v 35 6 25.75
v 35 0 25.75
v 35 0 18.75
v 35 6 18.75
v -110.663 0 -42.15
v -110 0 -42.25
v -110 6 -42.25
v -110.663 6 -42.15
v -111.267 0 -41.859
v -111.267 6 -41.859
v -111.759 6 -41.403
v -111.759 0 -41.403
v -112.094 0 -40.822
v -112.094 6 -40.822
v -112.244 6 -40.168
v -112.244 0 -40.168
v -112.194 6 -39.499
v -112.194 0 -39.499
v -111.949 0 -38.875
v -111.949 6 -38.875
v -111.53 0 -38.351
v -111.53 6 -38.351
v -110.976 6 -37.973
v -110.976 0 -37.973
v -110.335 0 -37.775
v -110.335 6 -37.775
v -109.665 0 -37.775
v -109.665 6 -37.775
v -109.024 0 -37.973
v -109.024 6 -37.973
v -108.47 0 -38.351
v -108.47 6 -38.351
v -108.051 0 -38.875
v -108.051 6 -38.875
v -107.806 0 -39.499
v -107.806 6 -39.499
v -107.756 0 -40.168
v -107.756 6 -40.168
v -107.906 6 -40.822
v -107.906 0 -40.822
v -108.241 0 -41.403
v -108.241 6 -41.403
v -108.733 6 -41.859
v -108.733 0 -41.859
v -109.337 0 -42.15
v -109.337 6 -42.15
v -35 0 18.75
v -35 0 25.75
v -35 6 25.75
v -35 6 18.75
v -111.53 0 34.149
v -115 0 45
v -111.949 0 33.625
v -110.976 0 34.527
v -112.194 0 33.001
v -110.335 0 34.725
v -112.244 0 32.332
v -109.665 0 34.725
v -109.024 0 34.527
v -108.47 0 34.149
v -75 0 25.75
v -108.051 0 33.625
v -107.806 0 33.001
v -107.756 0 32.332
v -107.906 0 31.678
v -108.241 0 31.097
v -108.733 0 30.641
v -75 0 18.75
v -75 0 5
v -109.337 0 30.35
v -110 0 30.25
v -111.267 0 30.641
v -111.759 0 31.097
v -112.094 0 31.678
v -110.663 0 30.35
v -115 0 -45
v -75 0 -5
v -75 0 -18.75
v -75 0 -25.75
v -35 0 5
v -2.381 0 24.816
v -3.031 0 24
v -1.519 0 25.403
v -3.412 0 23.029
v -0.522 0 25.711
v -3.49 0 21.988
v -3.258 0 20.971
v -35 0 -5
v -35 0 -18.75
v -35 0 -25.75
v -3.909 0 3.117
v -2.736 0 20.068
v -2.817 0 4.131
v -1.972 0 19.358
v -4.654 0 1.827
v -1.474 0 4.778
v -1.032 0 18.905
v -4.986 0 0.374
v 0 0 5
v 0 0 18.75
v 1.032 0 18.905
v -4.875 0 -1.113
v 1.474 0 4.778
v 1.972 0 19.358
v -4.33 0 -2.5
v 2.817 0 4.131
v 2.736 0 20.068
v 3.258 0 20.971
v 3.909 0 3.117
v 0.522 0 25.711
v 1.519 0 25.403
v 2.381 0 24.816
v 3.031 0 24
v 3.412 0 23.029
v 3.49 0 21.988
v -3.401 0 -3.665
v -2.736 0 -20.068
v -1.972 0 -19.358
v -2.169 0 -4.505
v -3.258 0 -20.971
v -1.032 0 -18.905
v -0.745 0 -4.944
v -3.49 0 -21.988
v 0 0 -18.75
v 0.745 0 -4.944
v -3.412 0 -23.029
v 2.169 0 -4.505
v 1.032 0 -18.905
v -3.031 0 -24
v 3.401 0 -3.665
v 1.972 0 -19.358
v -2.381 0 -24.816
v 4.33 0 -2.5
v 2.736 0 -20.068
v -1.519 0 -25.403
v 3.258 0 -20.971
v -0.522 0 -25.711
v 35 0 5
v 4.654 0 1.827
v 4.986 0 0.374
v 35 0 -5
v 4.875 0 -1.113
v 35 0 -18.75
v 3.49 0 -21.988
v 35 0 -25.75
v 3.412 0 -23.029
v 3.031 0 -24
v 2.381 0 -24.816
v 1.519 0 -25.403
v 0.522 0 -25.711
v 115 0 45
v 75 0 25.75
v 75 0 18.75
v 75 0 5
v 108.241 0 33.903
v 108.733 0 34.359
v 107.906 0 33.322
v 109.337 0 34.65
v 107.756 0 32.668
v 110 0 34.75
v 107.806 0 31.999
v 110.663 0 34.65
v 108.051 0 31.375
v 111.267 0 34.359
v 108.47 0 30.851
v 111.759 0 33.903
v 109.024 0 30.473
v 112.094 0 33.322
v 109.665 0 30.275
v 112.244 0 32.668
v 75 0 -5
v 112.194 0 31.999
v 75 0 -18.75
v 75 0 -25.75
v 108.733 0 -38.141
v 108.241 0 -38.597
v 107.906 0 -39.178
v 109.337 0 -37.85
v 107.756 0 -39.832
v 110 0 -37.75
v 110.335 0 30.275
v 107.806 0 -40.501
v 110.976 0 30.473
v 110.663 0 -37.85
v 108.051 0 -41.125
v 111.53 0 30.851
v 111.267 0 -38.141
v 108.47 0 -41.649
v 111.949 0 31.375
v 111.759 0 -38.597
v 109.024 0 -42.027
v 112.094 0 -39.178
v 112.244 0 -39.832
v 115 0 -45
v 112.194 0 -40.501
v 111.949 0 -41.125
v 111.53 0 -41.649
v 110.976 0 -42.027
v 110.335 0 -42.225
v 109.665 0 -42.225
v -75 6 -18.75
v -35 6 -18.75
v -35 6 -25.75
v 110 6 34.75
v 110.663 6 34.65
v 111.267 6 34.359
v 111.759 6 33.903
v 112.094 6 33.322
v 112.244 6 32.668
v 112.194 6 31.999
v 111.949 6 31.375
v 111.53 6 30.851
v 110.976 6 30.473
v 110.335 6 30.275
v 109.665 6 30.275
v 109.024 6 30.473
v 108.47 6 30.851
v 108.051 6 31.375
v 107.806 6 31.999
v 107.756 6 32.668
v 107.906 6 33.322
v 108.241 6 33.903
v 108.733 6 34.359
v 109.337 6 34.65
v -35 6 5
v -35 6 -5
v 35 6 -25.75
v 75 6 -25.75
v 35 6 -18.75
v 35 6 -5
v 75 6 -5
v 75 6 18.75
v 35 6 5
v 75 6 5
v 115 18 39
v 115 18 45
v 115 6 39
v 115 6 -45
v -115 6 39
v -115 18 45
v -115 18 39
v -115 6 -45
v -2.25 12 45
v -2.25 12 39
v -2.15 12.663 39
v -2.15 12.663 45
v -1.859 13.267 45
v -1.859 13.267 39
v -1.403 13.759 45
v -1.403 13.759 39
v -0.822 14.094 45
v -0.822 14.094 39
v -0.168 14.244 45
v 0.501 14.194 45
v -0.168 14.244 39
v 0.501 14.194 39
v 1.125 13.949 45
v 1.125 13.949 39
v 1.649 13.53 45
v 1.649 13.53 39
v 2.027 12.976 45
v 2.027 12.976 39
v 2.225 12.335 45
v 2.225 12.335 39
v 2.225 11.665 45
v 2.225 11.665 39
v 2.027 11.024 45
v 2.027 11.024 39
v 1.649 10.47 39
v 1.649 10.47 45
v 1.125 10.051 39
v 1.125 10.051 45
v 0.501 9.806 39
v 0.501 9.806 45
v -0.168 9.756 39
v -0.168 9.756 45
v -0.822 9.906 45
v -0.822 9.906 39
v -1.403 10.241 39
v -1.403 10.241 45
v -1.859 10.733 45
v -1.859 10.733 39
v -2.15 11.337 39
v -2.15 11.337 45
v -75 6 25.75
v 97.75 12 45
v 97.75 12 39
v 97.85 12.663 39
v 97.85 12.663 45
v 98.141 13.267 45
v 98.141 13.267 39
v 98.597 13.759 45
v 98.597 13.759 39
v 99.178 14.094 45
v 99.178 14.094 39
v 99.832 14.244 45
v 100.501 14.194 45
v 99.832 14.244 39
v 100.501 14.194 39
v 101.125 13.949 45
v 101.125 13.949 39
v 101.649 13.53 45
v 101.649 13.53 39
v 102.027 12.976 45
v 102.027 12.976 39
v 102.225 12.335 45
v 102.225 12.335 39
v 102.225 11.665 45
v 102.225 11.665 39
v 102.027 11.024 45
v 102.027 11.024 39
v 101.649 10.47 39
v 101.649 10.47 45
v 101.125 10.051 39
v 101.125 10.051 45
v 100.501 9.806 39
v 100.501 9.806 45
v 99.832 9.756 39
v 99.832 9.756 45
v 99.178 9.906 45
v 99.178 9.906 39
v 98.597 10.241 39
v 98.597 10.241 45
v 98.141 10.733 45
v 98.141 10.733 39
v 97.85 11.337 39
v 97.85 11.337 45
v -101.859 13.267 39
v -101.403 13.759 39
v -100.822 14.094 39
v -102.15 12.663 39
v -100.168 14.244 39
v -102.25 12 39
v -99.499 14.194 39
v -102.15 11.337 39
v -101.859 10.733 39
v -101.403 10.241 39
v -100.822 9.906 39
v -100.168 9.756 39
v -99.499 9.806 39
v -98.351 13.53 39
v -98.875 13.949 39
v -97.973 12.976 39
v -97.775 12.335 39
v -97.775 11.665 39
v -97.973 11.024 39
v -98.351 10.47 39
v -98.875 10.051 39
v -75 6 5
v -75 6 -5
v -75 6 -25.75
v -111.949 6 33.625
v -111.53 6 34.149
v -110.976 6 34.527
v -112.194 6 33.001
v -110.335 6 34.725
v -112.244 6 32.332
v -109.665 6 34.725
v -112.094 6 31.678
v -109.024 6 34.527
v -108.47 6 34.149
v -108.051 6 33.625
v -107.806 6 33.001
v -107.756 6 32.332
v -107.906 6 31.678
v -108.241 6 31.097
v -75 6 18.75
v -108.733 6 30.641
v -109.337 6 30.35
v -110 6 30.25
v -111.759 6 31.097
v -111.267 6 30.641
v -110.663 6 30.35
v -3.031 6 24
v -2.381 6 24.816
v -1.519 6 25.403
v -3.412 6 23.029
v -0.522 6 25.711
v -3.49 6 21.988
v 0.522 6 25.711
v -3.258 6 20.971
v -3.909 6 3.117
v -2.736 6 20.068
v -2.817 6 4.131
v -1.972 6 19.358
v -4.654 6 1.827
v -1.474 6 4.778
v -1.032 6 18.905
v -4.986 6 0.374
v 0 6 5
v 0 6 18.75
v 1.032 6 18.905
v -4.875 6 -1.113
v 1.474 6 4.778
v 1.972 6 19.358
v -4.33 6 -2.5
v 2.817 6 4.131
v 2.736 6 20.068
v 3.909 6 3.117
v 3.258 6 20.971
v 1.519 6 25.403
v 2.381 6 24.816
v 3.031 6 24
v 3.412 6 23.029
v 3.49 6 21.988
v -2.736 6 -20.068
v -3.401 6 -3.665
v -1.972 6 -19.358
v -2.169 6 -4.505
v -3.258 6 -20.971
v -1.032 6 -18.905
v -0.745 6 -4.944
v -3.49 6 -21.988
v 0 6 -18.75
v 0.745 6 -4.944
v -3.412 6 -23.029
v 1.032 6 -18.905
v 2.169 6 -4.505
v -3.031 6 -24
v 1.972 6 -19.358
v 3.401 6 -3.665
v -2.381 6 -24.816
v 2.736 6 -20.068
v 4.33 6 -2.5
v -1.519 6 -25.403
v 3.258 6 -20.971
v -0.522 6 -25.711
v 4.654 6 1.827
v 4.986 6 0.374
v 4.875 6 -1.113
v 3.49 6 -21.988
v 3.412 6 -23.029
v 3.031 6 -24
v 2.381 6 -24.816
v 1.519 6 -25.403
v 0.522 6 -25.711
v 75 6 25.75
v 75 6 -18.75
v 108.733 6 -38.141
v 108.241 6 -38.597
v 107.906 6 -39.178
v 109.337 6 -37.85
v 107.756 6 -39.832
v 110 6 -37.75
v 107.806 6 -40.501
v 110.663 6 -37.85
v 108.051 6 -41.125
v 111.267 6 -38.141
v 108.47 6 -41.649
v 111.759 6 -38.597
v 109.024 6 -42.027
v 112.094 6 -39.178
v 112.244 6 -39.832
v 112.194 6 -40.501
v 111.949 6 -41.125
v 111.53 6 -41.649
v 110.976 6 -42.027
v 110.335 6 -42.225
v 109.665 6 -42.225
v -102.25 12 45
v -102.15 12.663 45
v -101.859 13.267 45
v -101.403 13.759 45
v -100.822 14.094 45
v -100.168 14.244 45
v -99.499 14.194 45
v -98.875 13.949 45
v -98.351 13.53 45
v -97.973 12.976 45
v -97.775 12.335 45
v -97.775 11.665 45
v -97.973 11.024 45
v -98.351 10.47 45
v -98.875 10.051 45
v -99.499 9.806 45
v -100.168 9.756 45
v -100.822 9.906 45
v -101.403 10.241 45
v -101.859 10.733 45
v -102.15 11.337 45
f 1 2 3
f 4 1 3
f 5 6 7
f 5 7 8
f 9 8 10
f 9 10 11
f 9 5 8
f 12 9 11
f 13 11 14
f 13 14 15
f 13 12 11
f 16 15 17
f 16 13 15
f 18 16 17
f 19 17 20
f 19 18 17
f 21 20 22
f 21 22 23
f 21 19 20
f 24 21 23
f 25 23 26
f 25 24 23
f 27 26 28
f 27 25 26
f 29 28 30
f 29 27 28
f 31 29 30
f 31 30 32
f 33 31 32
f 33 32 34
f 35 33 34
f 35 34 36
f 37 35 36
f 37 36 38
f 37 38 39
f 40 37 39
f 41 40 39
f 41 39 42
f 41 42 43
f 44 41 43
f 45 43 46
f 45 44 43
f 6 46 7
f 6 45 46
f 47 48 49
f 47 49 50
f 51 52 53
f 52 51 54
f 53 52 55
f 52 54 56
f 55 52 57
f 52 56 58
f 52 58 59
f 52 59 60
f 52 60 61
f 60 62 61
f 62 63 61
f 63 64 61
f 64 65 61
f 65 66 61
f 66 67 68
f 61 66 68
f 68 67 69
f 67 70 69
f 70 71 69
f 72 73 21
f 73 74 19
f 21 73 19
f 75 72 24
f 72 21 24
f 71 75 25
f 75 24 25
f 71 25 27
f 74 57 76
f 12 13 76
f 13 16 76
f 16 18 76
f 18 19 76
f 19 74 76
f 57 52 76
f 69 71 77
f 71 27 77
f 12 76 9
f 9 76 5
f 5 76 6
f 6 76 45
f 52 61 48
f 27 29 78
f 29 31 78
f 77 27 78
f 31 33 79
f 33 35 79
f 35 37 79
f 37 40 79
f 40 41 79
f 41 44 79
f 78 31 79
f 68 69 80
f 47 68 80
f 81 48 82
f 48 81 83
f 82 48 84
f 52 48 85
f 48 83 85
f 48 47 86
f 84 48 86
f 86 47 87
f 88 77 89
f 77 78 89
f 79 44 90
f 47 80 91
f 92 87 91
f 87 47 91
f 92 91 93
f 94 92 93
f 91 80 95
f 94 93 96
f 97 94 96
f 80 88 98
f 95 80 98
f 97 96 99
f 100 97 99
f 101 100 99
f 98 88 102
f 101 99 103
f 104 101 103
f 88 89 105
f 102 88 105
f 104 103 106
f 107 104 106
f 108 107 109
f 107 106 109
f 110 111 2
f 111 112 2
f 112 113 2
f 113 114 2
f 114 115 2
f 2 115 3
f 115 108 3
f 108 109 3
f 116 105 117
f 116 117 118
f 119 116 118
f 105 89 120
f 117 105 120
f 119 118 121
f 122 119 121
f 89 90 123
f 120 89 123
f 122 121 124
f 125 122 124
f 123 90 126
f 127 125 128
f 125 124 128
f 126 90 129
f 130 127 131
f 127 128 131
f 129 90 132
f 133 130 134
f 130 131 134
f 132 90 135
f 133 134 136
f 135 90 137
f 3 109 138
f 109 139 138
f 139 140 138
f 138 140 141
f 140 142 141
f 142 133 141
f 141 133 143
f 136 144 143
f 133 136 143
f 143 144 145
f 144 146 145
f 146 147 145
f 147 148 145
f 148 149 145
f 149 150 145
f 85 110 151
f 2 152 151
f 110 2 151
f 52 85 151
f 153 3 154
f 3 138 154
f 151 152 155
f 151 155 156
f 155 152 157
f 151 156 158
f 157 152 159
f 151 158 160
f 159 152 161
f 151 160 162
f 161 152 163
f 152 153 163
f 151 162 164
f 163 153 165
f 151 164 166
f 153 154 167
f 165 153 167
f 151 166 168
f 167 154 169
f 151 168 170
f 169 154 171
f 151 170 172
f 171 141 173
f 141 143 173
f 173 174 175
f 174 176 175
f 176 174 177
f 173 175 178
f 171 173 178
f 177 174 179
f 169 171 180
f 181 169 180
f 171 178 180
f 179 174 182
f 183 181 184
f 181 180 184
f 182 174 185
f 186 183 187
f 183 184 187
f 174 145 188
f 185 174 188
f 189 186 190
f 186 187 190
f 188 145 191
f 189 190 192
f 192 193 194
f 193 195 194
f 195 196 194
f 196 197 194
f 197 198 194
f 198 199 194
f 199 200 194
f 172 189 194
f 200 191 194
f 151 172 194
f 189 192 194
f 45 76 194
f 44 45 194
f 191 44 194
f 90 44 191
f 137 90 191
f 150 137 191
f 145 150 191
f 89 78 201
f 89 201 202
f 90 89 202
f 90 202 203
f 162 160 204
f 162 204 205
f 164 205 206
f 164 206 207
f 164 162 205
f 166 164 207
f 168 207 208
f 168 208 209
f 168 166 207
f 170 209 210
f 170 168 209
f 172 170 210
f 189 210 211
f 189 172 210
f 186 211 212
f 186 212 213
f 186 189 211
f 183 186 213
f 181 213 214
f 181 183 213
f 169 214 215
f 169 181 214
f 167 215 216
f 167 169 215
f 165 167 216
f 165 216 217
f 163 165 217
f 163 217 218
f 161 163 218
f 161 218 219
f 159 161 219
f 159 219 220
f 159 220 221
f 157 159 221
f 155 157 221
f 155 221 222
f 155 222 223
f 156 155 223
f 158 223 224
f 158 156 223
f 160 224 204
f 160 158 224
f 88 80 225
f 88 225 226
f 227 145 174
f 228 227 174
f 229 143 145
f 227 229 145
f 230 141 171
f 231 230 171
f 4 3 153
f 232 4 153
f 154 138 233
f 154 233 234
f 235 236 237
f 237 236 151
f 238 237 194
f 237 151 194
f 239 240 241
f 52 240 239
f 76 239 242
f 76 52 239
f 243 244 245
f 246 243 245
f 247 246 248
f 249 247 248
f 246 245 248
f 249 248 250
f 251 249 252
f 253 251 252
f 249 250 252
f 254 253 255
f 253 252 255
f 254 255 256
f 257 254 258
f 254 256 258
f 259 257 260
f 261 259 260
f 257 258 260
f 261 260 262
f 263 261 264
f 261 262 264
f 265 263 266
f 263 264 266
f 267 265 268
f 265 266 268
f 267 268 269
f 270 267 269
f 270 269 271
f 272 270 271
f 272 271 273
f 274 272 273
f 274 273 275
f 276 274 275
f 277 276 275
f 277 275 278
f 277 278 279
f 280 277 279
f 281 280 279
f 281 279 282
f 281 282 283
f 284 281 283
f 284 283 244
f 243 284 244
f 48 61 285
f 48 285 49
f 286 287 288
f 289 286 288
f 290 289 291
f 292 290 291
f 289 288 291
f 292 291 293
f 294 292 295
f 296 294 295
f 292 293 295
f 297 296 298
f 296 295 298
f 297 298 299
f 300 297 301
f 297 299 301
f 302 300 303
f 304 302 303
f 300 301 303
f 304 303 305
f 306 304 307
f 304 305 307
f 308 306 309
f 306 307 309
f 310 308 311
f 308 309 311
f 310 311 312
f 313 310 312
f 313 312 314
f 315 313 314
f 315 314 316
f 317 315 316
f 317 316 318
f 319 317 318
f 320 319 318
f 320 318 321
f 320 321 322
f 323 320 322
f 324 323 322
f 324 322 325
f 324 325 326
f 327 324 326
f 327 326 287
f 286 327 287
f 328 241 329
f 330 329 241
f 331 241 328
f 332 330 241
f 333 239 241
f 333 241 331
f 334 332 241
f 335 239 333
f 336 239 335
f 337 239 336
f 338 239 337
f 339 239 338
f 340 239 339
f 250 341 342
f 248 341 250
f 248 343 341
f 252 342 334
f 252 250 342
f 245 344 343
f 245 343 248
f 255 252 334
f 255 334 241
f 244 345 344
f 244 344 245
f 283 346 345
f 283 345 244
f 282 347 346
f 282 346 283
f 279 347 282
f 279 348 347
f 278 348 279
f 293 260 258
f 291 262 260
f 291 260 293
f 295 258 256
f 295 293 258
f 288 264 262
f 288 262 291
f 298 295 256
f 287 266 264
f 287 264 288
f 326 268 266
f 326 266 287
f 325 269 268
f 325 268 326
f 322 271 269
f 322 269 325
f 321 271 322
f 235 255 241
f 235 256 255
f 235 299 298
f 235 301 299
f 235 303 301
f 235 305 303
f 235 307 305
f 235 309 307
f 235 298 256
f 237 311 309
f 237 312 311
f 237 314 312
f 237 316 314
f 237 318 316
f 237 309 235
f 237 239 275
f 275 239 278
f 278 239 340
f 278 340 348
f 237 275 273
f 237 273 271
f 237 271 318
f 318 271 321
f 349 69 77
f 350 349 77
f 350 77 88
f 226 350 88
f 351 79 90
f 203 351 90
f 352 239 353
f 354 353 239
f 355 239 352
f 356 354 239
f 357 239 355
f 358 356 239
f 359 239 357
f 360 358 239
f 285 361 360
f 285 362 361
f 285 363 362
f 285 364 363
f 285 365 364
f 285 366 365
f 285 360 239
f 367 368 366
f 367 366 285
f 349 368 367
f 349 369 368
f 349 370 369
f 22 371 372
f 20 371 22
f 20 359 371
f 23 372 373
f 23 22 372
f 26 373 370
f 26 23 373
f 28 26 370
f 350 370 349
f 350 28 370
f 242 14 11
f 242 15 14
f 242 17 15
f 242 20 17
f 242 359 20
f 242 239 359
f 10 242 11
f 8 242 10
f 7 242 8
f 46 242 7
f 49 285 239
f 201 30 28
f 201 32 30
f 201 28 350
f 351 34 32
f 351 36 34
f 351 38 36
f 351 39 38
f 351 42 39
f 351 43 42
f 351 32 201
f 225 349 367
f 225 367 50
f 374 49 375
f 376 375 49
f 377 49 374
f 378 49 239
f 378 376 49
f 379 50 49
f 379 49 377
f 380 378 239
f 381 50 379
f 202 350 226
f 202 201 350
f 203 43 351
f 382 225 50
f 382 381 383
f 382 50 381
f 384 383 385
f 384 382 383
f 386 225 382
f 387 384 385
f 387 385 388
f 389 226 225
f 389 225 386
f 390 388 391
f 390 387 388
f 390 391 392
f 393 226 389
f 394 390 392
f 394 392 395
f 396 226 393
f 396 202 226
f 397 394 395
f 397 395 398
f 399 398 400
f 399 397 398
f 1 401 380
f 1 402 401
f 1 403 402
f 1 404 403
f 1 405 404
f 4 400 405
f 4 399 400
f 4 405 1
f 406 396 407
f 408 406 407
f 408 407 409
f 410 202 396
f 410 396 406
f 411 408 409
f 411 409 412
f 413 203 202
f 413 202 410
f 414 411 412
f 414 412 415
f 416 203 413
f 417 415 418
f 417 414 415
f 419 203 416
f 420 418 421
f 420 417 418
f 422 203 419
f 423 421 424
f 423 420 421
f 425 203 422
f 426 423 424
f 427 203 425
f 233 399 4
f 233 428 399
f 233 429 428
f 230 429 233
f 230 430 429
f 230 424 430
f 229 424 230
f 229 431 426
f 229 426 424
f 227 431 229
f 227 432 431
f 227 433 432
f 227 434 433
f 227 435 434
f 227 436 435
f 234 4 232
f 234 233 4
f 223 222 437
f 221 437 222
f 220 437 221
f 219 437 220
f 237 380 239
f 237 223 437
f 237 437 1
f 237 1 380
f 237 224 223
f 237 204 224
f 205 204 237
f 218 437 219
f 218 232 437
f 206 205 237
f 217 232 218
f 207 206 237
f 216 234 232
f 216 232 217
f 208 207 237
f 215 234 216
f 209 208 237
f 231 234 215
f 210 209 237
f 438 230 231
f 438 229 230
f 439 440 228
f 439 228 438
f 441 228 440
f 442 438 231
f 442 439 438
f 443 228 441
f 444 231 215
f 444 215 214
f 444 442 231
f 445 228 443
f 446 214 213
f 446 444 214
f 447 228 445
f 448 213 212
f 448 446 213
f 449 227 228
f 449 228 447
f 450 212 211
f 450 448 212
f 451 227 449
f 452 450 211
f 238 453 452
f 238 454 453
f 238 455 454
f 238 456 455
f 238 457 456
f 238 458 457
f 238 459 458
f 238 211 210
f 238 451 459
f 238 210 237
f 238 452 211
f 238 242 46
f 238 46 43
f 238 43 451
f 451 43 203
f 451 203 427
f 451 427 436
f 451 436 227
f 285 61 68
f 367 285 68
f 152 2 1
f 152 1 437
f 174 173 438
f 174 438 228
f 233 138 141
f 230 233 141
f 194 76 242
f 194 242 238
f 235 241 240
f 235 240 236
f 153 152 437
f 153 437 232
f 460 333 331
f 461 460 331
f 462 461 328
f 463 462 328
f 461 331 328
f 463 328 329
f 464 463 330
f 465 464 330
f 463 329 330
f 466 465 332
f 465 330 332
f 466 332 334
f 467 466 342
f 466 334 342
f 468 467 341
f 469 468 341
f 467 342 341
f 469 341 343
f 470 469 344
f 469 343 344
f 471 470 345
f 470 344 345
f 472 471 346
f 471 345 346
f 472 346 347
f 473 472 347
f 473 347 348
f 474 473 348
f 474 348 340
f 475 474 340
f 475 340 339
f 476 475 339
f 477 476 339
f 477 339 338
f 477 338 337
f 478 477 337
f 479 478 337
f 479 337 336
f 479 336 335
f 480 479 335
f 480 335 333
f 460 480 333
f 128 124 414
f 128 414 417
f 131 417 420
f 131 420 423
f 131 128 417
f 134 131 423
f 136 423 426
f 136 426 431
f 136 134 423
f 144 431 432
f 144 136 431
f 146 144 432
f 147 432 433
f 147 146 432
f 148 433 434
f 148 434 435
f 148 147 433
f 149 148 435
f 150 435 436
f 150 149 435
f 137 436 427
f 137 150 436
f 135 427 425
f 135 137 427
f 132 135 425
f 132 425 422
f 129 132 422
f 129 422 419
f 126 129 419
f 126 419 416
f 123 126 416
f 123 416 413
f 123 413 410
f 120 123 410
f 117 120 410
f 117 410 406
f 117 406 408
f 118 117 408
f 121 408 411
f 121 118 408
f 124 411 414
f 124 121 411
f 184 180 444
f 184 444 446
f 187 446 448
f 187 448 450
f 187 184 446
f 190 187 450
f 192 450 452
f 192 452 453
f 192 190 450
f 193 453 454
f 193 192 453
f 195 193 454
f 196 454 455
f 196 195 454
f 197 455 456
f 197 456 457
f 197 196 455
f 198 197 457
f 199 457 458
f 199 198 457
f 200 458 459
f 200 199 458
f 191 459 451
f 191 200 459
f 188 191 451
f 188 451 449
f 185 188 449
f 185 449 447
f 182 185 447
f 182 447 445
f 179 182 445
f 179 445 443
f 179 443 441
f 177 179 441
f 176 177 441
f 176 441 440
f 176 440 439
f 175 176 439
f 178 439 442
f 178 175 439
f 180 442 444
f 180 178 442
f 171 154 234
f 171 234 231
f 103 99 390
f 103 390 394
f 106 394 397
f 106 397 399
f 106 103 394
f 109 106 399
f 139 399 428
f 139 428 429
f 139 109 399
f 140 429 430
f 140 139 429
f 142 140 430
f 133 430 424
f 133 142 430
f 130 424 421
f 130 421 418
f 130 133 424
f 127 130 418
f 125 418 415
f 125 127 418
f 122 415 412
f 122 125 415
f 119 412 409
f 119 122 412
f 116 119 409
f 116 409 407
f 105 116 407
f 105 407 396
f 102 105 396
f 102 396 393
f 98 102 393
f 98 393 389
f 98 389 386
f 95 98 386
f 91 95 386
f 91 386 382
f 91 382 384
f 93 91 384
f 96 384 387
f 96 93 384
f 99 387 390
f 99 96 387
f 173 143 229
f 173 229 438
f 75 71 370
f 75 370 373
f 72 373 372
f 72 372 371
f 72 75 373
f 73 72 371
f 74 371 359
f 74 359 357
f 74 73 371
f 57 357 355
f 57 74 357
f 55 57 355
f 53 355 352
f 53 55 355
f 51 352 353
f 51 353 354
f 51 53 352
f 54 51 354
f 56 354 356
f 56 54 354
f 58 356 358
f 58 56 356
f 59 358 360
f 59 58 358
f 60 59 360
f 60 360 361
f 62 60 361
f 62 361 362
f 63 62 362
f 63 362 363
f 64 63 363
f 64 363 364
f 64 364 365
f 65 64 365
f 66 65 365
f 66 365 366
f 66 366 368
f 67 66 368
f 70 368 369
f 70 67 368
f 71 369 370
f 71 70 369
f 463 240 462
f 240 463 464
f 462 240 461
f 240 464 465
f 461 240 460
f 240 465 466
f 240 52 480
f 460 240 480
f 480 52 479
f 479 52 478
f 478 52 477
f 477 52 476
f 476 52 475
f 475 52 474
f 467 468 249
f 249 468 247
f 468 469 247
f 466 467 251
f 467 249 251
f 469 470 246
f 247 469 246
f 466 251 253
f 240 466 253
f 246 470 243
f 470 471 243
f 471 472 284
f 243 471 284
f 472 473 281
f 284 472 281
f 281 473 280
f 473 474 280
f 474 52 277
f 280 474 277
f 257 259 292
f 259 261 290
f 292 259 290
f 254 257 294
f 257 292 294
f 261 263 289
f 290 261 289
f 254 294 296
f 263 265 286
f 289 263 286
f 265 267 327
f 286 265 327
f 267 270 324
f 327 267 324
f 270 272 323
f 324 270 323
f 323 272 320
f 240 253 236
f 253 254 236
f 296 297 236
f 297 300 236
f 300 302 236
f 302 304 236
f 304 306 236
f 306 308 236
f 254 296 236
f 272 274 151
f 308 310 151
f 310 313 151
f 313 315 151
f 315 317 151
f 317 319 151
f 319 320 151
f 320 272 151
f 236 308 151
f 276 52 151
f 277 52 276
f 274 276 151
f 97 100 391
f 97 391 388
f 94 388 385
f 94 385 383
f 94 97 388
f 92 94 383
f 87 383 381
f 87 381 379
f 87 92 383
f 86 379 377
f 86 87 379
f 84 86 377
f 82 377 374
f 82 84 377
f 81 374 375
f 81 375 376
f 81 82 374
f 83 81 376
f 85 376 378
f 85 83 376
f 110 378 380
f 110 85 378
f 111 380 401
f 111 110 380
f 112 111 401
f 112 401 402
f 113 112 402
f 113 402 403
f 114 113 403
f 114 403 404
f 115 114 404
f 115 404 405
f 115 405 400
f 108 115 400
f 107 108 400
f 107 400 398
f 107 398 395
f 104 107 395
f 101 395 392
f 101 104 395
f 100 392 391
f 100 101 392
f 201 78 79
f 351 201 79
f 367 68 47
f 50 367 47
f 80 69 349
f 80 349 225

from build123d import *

# Parameters (mm, degrees)
SKETCH1_W           = 230
SKETCH1_H           = 90
SKETCH1_R           = 5
SKETCH1_R_2         = 3.5
SKETCH1_R_3         = 2.25
SKETCH1_W_2         = 40
SKETCH1_H_2         = 10
SKETCH1_H_3         = 7
BOSS_EXTRUDE1_DEPTH = 6
SKETCH2_W           = 230
SKETCH2_H           = 6
BOSS_EXTRUDE2_DEPTH = 12
CUT_EXTRUDE1_REACH  = 145.544
SKETCH3_R           = 2.25


with BuildPart() as part:
    # Sketch1 → Boss-Extrude1 (new body)
    with BuildSketch(Plane(origin=(0, 0, 0), x_dir=(1, 0, 0), z_dir=(0, 1, 0))):
        Rectangle(SKETCH1_W, SKETCH1_H)
        with Locations(Location((0, 0, 0), (0, 0, 270))):
            Circle(SKETCH1_R, mode=Mode.SUBTRACT)
        with Locations(Location((0, 22.25, 0), (0, 0, 270))):
            Circle(SKETCH1_R_2, mode=Mode.SUBTRACT)
        with Locations(Location((0, -22.25, 0), (0, 0, 90))):
            Circle(SKETCH1_R_2, mode=Mode.SUBTRACT)
        with Locations(Location((110, 40, 0), (0, 0, 270))):
            Circle(SKETCH1_R_3, mode=Mode.SUBTRACT)
        with Locations(Location((110, -32.5, 0), (0, 0, 270))):
            Circle(SKETCH1_R_3, mode=Mode.SUBTRACT)
        with Locations(Location((-110, 40, 0), (0, 0, 90))):
            Circle(SKETCH1_R_3, mode=Mode.SUBTRACT)
        with Locations(Location((-110, -32.5, 0), (0, 0, 90))):
            Circle(SKETCH1_R_3, mode=Mode.SUBTRACT)
        with Locations((55, 0)):
            Rectangle(SKETCH1_W_2, SKETCH1_H_2, mode=Mode.SUBTRACT)
        with Locations((55, 22.25)):
            Rectangle(SKETCH1_W_2, SKETCH1_H_3, mode=Mode.SUBTRACT)
        with Locations((55, -22.25)):
            Rectangle(SKETCH1_W_2, SKETCH1_H_3, mode=Mode.SUBTRACT)
        with Locations((-55, -22.25)):
            Rectangle(SKETCH1_W_2, SKETCH1_H_3, mode=Mode.SUBTRACT)
        with Locations((-55, 0)):
            Rectangle(SKETCH1_W_2, SKETCH1_H_2, mode=Mode.SUBTRACT)
        with Locations((-55, 22.25)):
            Rectangle(SKETCH1_W_2, SKETCH1_H_3, mode=Mode.SUBTRACT)
    extrude(amount=BOSS_EXTRUDE1_DEPTH)

    # Sketch2 → Boss-Extrude2 (add)
    with BuildSketch(Plane(origin=(0, 6, 0), x_dir=(1, 0, 0), z_dir=(0, 1, 0))):
        with Locations((0, -42)):
            Rectangle(SKETCH2_W, SKETCH2_H)
    extrude(amount=BOSS_EXTRUDE2_DEPTH)

    # Sketch3 → Cut-Extrude1 (cut, up to next)
    with BuildSketch(Plane(origin=(0, 0, 39), x_dir=(-1, 0, 0), z_dir=(0, 0, -1)), mode=Mode.PRIVATE) as cut_extrude1_sk1:
        with Locations((0, 12)):
            Circle(SKETCH3_R)
    cut_extrude1_tool1 = extrude(cut_extrude1_sk1.sketch, amount=-CUT_EXTRUDE1_REACH, mode=Mode.PRIVATE) & part.part
    # Sketch3 → Cut-Extrude1 (cut, up to next)
    with BuildSketch(Plane(origin=(0, 0, 39), x_dir=(-1, 0, 0), z_dir=(0, 0, -1)), mode=Mode.PRIVATE) as cut_extrude1_sk2:
        with Locations((100, 12)):
            Circle(SKETCH3_R)
    cut_extrude1_tool2 = extrude(cut_extrude1_sk2.sketch, amount=-CUT_EXTRUDE1_REACH, mode=Mode.PRIVATE) & part.part
    # Sketch3 → Cut-Extrude1 (cut, up to next)
    with BuildSketch(Plane(origin=(0, 0, 39), x_dir=(-1, 0, 0), z_dir=(0, 0, -1)), mode=Mode.PRIVATE) as cut_extrude1_sk3:
        with Locations((-100, 12)):
            Circle(SKETCH3_R)
    cut_extrude1_tool3 = extrude(cut_extrude1_sk3.sketch, amount=-CUT_EXTRUDE1_REACH, mode=Mode.PRIVATE) & part.part
    add(cut_extrude1_tool1.solids().sort_by_distance((0, 12, 39))[0], mode=Mode.SUBTRACT)
    add(cut_extrude1_tool2.solids().sort_by_distance((-100, 12, 39))[0], mode=Mode.SUBTRACT)
    add(cut_extrude1_tool3.solids().sort_by_distance((100, 12, 39))[0], mode=Mode.SUBTRACT)


solid = part.part
